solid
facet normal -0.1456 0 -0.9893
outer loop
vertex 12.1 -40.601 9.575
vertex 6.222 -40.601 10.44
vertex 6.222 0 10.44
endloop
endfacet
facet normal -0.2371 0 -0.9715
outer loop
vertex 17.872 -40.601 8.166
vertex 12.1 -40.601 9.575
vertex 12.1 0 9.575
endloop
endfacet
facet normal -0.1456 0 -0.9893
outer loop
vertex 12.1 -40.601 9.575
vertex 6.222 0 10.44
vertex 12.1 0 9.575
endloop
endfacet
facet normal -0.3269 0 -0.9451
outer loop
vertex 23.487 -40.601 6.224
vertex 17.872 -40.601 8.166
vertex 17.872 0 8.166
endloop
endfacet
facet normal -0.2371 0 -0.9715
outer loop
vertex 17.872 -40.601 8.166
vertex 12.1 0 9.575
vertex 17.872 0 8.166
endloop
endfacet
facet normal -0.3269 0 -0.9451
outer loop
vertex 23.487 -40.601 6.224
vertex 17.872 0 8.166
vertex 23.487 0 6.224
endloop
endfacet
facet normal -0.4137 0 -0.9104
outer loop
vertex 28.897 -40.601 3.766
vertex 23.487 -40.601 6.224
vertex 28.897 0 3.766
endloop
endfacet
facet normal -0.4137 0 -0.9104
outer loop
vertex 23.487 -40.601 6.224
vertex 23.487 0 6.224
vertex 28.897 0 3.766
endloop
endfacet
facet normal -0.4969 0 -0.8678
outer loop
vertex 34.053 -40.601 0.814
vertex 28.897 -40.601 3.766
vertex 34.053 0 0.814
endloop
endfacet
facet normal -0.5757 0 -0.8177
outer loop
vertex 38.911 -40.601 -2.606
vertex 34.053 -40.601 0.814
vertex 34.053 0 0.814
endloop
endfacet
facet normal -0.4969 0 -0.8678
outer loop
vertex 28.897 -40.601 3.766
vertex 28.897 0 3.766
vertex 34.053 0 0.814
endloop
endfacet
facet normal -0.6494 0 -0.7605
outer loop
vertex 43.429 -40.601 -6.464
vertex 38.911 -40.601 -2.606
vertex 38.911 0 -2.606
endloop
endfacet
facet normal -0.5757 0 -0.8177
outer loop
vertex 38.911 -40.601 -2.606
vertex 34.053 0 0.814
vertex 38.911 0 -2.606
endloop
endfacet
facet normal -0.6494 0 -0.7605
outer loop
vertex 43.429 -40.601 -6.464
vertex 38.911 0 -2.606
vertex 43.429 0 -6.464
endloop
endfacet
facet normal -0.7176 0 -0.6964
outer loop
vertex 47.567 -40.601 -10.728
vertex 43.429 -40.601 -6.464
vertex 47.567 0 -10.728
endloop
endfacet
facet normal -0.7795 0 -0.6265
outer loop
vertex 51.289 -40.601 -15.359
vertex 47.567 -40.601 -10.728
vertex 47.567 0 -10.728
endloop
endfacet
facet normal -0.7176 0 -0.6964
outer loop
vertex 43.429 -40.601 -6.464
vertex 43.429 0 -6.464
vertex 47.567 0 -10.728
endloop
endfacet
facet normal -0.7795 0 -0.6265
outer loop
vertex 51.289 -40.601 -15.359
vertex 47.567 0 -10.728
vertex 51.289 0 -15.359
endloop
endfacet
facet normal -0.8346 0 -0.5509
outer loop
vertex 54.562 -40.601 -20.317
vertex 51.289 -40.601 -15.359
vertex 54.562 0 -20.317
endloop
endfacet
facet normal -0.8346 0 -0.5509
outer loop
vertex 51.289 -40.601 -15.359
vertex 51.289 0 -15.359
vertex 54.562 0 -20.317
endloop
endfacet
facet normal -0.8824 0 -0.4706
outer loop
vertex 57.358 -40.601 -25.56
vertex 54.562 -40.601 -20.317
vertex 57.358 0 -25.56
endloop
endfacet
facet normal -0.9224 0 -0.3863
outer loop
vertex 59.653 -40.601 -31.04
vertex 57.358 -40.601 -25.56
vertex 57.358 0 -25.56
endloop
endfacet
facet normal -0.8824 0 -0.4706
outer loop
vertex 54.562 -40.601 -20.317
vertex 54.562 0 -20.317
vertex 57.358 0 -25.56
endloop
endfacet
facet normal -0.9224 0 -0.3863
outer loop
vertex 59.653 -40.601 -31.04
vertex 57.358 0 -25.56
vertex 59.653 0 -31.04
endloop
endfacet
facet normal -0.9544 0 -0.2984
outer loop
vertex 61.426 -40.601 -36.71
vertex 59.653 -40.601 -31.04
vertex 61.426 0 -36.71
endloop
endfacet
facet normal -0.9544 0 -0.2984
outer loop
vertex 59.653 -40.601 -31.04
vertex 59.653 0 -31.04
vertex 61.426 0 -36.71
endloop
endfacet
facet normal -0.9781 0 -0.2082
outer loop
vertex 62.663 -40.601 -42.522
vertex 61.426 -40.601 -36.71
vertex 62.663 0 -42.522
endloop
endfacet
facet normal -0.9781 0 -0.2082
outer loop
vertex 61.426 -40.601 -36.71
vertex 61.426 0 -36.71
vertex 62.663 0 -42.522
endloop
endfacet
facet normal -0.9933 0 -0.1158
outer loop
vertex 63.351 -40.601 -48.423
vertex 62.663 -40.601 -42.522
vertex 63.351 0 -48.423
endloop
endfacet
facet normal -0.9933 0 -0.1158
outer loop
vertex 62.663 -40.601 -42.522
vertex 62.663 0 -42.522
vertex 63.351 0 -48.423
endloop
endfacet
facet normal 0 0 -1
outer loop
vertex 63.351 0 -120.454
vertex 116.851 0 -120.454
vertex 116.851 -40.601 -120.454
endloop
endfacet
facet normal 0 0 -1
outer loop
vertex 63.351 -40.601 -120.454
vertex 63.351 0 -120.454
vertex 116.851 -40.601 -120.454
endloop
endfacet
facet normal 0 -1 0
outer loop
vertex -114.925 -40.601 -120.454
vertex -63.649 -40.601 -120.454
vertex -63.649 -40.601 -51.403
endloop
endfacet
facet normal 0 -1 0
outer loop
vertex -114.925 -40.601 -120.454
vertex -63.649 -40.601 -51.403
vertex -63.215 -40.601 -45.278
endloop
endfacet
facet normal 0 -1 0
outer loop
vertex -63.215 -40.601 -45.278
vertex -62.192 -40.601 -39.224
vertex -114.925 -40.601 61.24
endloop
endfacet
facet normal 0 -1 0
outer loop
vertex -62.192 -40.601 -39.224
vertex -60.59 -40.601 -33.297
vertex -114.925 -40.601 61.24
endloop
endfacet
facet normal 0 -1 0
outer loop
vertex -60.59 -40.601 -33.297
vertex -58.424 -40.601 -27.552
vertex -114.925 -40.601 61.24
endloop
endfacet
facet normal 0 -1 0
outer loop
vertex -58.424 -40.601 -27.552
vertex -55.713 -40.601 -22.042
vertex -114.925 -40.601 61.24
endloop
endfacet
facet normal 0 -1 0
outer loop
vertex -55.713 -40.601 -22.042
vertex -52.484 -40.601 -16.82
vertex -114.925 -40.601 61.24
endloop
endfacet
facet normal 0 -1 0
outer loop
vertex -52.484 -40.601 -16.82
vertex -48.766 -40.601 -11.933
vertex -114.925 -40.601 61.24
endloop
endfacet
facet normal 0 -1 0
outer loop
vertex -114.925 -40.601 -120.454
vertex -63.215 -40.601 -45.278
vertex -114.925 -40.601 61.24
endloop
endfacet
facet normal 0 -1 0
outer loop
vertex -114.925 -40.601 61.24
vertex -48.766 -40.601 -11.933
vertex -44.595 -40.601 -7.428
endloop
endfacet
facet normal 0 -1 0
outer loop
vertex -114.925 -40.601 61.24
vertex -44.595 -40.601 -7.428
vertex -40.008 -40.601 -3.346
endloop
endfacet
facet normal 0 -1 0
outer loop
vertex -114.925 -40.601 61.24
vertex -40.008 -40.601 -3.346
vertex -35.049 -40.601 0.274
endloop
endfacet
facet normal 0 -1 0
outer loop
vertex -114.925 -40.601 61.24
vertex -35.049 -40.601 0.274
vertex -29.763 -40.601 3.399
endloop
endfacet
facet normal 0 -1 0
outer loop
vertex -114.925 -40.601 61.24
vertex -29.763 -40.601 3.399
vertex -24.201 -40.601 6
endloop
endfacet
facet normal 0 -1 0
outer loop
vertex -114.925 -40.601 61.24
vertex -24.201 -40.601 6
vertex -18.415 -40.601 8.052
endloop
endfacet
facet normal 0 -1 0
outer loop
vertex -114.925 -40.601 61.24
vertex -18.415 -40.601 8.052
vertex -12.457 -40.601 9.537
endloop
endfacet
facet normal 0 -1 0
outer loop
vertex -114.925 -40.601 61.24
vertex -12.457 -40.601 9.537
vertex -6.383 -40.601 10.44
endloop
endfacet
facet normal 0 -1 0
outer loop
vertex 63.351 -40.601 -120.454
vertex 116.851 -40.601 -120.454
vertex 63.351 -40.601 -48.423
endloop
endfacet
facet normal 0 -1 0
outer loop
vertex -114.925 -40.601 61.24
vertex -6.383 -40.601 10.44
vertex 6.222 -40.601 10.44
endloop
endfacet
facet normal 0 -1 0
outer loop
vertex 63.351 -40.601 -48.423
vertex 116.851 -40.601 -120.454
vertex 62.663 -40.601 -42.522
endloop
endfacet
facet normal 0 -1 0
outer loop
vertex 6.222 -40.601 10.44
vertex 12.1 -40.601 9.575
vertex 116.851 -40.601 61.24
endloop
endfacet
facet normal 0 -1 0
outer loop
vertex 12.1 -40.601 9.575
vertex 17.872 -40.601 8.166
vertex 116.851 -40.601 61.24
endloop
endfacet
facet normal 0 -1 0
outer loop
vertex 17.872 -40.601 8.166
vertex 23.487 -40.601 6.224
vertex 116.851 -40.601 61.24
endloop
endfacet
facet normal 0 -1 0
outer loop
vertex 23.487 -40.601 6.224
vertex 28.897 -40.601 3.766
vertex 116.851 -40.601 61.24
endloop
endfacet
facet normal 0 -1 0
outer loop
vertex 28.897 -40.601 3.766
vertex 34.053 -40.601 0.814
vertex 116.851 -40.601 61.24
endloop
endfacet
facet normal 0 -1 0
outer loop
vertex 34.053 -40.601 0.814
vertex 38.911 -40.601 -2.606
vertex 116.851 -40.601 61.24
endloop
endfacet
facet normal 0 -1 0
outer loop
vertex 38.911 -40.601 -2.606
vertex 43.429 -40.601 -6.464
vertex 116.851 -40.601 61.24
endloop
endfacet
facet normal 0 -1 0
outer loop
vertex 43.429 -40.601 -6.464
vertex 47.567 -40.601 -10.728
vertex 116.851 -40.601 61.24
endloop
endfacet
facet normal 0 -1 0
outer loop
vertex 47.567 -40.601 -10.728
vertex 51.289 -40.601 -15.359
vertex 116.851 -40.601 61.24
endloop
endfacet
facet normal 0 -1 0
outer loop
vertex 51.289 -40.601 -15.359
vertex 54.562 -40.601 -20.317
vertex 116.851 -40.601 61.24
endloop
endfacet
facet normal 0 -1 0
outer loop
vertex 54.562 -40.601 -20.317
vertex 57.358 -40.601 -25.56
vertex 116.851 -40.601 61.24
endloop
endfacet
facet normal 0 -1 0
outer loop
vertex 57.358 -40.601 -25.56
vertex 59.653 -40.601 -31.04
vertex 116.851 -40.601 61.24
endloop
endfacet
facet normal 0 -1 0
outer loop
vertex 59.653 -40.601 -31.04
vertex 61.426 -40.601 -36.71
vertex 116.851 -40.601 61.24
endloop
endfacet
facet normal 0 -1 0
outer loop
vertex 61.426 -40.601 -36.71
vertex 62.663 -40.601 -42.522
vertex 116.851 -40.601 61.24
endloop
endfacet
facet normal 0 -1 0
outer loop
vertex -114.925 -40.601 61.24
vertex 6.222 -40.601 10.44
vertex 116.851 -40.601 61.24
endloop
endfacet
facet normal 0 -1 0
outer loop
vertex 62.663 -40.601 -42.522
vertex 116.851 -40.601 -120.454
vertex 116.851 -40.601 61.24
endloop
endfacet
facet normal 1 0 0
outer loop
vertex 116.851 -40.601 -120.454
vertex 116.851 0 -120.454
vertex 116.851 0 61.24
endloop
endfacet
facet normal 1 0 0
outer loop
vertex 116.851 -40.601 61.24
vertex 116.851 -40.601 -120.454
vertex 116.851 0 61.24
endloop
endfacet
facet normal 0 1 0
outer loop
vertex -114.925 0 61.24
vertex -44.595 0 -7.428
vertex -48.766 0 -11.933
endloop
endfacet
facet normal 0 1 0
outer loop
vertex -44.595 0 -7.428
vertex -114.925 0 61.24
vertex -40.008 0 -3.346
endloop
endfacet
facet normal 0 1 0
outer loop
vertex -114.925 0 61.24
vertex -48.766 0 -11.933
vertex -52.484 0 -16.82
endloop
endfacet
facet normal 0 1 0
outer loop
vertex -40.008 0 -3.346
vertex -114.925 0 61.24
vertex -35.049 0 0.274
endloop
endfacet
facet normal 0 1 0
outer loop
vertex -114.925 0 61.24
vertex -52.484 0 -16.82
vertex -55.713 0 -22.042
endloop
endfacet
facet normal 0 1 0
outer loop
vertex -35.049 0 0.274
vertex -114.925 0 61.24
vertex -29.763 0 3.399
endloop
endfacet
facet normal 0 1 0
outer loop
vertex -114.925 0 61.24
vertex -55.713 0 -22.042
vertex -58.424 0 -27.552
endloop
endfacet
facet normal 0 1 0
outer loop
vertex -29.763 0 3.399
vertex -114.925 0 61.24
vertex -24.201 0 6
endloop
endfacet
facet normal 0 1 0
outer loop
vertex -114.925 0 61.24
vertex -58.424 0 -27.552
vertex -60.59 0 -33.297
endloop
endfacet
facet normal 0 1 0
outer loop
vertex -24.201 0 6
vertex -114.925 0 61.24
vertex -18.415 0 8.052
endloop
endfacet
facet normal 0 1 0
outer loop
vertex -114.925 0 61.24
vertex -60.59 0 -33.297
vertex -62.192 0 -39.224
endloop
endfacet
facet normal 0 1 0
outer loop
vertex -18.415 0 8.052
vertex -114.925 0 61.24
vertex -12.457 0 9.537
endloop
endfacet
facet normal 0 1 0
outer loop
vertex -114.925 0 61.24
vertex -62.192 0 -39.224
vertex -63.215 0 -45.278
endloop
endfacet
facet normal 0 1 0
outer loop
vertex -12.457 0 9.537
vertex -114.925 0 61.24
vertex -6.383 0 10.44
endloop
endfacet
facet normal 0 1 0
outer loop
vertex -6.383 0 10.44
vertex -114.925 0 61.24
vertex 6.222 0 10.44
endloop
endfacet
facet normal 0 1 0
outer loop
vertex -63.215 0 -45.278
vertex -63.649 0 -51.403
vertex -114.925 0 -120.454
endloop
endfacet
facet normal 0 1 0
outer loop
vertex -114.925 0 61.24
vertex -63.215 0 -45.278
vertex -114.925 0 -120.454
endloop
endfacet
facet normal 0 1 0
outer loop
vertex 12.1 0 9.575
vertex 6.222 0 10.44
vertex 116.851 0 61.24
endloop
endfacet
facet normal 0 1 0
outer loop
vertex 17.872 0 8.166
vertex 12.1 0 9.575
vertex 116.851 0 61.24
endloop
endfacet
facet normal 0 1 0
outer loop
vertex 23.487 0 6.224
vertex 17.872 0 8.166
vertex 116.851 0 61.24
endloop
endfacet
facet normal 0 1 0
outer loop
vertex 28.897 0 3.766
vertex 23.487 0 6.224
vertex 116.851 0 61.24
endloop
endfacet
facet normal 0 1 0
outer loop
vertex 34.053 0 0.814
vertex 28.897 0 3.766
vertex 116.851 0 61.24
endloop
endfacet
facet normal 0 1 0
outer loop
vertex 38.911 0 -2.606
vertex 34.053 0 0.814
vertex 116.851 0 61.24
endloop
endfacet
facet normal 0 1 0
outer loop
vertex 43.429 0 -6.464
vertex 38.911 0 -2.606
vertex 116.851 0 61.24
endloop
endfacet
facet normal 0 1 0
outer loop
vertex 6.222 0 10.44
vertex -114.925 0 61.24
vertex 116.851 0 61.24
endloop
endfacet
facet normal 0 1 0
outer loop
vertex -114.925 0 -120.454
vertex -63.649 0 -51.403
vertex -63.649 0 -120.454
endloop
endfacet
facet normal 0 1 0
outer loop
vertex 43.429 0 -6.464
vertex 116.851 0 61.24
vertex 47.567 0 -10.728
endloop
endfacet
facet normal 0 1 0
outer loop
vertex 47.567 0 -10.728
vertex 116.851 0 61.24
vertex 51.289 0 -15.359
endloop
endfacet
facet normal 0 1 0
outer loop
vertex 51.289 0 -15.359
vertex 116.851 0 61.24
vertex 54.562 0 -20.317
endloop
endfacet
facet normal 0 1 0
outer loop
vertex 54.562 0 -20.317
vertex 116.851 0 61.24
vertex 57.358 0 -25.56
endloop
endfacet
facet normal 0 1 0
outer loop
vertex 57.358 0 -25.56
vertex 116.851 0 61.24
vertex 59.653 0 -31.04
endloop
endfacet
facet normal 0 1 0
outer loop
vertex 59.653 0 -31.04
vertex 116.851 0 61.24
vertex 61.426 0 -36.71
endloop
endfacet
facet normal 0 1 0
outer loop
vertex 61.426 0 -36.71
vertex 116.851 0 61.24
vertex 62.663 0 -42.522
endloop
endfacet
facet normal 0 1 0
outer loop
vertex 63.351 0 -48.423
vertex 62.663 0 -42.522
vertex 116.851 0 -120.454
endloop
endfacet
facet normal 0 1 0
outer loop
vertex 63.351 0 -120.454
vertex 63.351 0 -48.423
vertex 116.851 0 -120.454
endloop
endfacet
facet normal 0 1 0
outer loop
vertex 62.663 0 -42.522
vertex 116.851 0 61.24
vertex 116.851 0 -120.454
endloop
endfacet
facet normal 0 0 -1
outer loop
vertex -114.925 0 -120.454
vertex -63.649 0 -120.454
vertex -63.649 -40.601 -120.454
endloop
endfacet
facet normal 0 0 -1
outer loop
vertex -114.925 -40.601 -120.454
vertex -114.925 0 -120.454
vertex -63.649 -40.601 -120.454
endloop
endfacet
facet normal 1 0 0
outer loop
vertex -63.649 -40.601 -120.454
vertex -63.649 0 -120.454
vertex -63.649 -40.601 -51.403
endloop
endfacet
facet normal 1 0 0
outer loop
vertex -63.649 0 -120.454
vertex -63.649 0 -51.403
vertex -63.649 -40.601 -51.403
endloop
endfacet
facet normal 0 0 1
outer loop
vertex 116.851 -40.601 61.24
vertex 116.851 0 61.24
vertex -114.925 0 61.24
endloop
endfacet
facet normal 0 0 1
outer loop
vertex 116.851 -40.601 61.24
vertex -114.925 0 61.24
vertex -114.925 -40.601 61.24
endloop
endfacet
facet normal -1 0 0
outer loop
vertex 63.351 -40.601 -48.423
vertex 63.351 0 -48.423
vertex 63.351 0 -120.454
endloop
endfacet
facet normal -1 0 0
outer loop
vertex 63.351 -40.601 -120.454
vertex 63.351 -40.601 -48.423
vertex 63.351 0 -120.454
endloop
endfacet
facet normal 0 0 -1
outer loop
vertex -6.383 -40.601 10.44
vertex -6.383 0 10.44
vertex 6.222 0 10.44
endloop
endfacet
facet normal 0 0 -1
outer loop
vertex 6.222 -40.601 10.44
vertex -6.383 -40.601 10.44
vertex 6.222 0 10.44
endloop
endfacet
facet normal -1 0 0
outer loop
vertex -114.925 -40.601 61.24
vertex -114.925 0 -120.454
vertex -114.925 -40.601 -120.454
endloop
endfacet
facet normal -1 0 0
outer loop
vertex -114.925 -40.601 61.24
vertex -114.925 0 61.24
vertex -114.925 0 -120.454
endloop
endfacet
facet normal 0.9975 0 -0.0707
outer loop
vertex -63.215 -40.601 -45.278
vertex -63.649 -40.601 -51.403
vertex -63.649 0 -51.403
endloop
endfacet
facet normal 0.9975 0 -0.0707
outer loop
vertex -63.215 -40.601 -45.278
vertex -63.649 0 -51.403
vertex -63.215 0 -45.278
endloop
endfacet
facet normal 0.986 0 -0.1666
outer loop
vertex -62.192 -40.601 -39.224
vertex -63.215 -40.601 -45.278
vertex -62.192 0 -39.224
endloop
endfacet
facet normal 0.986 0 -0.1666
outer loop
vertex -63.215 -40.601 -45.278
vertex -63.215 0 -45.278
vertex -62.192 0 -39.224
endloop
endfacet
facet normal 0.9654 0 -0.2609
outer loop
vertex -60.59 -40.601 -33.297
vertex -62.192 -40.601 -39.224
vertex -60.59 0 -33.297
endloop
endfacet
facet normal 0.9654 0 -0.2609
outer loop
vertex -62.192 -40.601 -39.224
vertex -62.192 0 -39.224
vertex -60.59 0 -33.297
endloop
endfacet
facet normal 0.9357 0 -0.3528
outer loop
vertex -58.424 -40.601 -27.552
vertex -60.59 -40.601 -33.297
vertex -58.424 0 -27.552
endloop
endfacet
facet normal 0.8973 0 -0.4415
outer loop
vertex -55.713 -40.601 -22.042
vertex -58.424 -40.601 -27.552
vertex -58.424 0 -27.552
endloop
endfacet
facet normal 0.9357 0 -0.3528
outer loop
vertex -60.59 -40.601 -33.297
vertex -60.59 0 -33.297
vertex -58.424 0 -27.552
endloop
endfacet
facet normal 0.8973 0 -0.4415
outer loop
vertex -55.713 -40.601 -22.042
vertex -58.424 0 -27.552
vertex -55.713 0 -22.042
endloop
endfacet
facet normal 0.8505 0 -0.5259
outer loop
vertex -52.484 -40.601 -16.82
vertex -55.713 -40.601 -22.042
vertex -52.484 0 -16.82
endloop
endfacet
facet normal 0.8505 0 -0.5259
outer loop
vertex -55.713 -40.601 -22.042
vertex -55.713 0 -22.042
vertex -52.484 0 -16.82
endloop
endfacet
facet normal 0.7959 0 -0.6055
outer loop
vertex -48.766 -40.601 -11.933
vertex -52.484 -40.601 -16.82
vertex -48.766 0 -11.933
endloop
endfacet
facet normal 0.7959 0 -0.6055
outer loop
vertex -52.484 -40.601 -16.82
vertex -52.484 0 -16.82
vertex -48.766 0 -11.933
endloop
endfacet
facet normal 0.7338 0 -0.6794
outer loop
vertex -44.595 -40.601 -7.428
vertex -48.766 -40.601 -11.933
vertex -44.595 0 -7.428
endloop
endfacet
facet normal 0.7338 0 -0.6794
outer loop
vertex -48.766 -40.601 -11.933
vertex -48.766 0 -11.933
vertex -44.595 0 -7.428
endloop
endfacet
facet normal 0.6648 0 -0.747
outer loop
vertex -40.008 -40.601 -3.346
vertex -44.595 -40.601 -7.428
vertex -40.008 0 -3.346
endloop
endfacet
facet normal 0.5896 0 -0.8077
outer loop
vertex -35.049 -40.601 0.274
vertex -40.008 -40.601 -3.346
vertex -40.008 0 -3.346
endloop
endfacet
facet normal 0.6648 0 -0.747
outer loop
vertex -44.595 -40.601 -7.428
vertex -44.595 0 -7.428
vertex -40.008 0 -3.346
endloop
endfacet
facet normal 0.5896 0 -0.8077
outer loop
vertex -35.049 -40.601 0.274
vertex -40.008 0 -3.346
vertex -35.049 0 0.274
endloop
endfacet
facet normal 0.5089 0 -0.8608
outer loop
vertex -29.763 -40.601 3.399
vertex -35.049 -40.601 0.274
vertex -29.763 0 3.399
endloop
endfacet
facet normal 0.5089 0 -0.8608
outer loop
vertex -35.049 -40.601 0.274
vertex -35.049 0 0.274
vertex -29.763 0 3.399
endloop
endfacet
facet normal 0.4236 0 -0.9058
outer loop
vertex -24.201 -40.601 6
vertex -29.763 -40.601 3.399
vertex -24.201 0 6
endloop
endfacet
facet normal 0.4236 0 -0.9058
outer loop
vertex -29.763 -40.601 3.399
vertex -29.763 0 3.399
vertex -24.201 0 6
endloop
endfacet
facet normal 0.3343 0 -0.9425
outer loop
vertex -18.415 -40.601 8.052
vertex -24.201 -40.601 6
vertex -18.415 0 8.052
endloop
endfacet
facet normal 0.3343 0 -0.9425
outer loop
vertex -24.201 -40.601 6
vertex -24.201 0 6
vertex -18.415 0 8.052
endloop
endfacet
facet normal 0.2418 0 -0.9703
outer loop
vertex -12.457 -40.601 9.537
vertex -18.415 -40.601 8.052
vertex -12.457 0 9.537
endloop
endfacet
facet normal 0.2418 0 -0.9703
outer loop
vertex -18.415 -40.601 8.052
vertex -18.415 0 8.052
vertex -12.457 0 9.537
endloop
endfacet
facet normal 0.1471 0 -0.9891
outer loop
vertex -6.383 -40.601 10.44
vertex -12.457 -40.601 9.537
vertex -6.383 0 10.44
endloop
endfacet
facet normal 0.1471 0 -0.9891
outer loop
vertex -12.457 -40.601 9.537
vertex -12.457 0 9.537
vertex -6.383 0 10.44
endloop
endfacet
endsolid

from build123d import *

# Parameters (mm, degrees)
F1_DEPTH = 40.60075
F2_DEPTH = 68.56636
F3_DEPTH = 30.88144
F4_DEPTH = 24.11302


with BuildPart() as f1:
    # F0 (on Front) → F1 (new body)
    with BuildSketch(Plane.XZ):
        with BuildLine():
            Line((63.3510070145, 61.2396271003), (-63.6489929855, 61.2396271003))
            Line((-63.6489929855, 61.2396271003), (-63.6489929855, 10.4396271003))
            Line((-63.6489929855, 10.4396271003), (-6.3833664064, 10.4396271003))
            ThreePointArc((-6.3833664064, 10.4396271003), (-0.080511462, 10.7527853958), (6.2223434824, 10.4396271003))
            Line((6.2223434824, 10.4396271003), (63.3510070145, 10.4396271003))
            Line((63.3510070145, 10.4396271003), (63.3510070145, 61.2396271003))
        make_face()
        Polygon((-63.6489929855, 10.4396271003), (-63.6489929855, 61.2396271003), (-90.8120945096, 61.2396271003), (-90.8120945096, -51.8873035908), (-63.6489929855, -51.8873035908), (-63.6489929855, -51.4030717313), align=None)
        Polygon((85.9697833657, 61.2396271003), (63.3510070145, 61.2396271003), (63.3510070145, 10.4396271003), (63.3510070145, -48.4231859446), (63.3510070145, -51.8873035908), (85.9697833657, -51.8873035908), align=None)
        with BuildLine():
            Line((-6.3833664064, 10.4396271003), (-63.6489929855, 10.4396271003))
            Line((-63.6489929855, 10.4396271003), (-63.6489929855, -51.4030717313))
            ThreePointArc((-63.6489929855, -51.4030717313), (-46.7348870837, -9.6303342951), (-6.3833664064, 10.4396271003))
        make_face()
        with BuildLine():
            Line((63.3510070145, -48.4231859446), (63.3510070145, 10.4396271003))
            Line((63.3510070145, 10.4396271003), (6.2223434824, 10.4396271003))
            ThreePointArc((6.2223434824, 10.4396271003), (45.5476421166, -8.5478399689), (63.3510070145, -48.4231859446))
        make_face()
        with BuildLine():
            ThreePointArc((6.2223434824, 10.4396271003), (-0.080511462, 10.7527853958), (-6.3833664064, 10.4396271003))
            Line((-6.3833664064, 10.4396271003), (6.2223434824, 10.4396271003))
        make_face()
    extrude(amount=F1_DEPTH)

    # F2 (add): faces of the model
    f2_faces = [f1.faces().sort_by_distance(p)[0] for p in [
        (-77.2305437475, -20.300375, -51.8873035908),
        (74.6603951901, -20.300375, -51.8873035908),
    ]]
    extrude(f2_faces, amount=F2_DEPTH)

    # F3 (add): a face of the model
    f3_faces = [f1.faces().sort_by_distance(p)[0] for p in [
        (85.9697833657, -20.300375, -29.6070182453),
    ]]
    extrude(f3_faces, amount=F3_DEPTH)

    # F4 (add): a face of the model
    f4_faces = [f1.faces().sort_by_distance(p)[0] for p in [
        (-90.8120945096, -20.300375, -29.6070182453),
    ]]
    extrude(f4_faces, amount=F4_DEPTH)


solid = f1.part
